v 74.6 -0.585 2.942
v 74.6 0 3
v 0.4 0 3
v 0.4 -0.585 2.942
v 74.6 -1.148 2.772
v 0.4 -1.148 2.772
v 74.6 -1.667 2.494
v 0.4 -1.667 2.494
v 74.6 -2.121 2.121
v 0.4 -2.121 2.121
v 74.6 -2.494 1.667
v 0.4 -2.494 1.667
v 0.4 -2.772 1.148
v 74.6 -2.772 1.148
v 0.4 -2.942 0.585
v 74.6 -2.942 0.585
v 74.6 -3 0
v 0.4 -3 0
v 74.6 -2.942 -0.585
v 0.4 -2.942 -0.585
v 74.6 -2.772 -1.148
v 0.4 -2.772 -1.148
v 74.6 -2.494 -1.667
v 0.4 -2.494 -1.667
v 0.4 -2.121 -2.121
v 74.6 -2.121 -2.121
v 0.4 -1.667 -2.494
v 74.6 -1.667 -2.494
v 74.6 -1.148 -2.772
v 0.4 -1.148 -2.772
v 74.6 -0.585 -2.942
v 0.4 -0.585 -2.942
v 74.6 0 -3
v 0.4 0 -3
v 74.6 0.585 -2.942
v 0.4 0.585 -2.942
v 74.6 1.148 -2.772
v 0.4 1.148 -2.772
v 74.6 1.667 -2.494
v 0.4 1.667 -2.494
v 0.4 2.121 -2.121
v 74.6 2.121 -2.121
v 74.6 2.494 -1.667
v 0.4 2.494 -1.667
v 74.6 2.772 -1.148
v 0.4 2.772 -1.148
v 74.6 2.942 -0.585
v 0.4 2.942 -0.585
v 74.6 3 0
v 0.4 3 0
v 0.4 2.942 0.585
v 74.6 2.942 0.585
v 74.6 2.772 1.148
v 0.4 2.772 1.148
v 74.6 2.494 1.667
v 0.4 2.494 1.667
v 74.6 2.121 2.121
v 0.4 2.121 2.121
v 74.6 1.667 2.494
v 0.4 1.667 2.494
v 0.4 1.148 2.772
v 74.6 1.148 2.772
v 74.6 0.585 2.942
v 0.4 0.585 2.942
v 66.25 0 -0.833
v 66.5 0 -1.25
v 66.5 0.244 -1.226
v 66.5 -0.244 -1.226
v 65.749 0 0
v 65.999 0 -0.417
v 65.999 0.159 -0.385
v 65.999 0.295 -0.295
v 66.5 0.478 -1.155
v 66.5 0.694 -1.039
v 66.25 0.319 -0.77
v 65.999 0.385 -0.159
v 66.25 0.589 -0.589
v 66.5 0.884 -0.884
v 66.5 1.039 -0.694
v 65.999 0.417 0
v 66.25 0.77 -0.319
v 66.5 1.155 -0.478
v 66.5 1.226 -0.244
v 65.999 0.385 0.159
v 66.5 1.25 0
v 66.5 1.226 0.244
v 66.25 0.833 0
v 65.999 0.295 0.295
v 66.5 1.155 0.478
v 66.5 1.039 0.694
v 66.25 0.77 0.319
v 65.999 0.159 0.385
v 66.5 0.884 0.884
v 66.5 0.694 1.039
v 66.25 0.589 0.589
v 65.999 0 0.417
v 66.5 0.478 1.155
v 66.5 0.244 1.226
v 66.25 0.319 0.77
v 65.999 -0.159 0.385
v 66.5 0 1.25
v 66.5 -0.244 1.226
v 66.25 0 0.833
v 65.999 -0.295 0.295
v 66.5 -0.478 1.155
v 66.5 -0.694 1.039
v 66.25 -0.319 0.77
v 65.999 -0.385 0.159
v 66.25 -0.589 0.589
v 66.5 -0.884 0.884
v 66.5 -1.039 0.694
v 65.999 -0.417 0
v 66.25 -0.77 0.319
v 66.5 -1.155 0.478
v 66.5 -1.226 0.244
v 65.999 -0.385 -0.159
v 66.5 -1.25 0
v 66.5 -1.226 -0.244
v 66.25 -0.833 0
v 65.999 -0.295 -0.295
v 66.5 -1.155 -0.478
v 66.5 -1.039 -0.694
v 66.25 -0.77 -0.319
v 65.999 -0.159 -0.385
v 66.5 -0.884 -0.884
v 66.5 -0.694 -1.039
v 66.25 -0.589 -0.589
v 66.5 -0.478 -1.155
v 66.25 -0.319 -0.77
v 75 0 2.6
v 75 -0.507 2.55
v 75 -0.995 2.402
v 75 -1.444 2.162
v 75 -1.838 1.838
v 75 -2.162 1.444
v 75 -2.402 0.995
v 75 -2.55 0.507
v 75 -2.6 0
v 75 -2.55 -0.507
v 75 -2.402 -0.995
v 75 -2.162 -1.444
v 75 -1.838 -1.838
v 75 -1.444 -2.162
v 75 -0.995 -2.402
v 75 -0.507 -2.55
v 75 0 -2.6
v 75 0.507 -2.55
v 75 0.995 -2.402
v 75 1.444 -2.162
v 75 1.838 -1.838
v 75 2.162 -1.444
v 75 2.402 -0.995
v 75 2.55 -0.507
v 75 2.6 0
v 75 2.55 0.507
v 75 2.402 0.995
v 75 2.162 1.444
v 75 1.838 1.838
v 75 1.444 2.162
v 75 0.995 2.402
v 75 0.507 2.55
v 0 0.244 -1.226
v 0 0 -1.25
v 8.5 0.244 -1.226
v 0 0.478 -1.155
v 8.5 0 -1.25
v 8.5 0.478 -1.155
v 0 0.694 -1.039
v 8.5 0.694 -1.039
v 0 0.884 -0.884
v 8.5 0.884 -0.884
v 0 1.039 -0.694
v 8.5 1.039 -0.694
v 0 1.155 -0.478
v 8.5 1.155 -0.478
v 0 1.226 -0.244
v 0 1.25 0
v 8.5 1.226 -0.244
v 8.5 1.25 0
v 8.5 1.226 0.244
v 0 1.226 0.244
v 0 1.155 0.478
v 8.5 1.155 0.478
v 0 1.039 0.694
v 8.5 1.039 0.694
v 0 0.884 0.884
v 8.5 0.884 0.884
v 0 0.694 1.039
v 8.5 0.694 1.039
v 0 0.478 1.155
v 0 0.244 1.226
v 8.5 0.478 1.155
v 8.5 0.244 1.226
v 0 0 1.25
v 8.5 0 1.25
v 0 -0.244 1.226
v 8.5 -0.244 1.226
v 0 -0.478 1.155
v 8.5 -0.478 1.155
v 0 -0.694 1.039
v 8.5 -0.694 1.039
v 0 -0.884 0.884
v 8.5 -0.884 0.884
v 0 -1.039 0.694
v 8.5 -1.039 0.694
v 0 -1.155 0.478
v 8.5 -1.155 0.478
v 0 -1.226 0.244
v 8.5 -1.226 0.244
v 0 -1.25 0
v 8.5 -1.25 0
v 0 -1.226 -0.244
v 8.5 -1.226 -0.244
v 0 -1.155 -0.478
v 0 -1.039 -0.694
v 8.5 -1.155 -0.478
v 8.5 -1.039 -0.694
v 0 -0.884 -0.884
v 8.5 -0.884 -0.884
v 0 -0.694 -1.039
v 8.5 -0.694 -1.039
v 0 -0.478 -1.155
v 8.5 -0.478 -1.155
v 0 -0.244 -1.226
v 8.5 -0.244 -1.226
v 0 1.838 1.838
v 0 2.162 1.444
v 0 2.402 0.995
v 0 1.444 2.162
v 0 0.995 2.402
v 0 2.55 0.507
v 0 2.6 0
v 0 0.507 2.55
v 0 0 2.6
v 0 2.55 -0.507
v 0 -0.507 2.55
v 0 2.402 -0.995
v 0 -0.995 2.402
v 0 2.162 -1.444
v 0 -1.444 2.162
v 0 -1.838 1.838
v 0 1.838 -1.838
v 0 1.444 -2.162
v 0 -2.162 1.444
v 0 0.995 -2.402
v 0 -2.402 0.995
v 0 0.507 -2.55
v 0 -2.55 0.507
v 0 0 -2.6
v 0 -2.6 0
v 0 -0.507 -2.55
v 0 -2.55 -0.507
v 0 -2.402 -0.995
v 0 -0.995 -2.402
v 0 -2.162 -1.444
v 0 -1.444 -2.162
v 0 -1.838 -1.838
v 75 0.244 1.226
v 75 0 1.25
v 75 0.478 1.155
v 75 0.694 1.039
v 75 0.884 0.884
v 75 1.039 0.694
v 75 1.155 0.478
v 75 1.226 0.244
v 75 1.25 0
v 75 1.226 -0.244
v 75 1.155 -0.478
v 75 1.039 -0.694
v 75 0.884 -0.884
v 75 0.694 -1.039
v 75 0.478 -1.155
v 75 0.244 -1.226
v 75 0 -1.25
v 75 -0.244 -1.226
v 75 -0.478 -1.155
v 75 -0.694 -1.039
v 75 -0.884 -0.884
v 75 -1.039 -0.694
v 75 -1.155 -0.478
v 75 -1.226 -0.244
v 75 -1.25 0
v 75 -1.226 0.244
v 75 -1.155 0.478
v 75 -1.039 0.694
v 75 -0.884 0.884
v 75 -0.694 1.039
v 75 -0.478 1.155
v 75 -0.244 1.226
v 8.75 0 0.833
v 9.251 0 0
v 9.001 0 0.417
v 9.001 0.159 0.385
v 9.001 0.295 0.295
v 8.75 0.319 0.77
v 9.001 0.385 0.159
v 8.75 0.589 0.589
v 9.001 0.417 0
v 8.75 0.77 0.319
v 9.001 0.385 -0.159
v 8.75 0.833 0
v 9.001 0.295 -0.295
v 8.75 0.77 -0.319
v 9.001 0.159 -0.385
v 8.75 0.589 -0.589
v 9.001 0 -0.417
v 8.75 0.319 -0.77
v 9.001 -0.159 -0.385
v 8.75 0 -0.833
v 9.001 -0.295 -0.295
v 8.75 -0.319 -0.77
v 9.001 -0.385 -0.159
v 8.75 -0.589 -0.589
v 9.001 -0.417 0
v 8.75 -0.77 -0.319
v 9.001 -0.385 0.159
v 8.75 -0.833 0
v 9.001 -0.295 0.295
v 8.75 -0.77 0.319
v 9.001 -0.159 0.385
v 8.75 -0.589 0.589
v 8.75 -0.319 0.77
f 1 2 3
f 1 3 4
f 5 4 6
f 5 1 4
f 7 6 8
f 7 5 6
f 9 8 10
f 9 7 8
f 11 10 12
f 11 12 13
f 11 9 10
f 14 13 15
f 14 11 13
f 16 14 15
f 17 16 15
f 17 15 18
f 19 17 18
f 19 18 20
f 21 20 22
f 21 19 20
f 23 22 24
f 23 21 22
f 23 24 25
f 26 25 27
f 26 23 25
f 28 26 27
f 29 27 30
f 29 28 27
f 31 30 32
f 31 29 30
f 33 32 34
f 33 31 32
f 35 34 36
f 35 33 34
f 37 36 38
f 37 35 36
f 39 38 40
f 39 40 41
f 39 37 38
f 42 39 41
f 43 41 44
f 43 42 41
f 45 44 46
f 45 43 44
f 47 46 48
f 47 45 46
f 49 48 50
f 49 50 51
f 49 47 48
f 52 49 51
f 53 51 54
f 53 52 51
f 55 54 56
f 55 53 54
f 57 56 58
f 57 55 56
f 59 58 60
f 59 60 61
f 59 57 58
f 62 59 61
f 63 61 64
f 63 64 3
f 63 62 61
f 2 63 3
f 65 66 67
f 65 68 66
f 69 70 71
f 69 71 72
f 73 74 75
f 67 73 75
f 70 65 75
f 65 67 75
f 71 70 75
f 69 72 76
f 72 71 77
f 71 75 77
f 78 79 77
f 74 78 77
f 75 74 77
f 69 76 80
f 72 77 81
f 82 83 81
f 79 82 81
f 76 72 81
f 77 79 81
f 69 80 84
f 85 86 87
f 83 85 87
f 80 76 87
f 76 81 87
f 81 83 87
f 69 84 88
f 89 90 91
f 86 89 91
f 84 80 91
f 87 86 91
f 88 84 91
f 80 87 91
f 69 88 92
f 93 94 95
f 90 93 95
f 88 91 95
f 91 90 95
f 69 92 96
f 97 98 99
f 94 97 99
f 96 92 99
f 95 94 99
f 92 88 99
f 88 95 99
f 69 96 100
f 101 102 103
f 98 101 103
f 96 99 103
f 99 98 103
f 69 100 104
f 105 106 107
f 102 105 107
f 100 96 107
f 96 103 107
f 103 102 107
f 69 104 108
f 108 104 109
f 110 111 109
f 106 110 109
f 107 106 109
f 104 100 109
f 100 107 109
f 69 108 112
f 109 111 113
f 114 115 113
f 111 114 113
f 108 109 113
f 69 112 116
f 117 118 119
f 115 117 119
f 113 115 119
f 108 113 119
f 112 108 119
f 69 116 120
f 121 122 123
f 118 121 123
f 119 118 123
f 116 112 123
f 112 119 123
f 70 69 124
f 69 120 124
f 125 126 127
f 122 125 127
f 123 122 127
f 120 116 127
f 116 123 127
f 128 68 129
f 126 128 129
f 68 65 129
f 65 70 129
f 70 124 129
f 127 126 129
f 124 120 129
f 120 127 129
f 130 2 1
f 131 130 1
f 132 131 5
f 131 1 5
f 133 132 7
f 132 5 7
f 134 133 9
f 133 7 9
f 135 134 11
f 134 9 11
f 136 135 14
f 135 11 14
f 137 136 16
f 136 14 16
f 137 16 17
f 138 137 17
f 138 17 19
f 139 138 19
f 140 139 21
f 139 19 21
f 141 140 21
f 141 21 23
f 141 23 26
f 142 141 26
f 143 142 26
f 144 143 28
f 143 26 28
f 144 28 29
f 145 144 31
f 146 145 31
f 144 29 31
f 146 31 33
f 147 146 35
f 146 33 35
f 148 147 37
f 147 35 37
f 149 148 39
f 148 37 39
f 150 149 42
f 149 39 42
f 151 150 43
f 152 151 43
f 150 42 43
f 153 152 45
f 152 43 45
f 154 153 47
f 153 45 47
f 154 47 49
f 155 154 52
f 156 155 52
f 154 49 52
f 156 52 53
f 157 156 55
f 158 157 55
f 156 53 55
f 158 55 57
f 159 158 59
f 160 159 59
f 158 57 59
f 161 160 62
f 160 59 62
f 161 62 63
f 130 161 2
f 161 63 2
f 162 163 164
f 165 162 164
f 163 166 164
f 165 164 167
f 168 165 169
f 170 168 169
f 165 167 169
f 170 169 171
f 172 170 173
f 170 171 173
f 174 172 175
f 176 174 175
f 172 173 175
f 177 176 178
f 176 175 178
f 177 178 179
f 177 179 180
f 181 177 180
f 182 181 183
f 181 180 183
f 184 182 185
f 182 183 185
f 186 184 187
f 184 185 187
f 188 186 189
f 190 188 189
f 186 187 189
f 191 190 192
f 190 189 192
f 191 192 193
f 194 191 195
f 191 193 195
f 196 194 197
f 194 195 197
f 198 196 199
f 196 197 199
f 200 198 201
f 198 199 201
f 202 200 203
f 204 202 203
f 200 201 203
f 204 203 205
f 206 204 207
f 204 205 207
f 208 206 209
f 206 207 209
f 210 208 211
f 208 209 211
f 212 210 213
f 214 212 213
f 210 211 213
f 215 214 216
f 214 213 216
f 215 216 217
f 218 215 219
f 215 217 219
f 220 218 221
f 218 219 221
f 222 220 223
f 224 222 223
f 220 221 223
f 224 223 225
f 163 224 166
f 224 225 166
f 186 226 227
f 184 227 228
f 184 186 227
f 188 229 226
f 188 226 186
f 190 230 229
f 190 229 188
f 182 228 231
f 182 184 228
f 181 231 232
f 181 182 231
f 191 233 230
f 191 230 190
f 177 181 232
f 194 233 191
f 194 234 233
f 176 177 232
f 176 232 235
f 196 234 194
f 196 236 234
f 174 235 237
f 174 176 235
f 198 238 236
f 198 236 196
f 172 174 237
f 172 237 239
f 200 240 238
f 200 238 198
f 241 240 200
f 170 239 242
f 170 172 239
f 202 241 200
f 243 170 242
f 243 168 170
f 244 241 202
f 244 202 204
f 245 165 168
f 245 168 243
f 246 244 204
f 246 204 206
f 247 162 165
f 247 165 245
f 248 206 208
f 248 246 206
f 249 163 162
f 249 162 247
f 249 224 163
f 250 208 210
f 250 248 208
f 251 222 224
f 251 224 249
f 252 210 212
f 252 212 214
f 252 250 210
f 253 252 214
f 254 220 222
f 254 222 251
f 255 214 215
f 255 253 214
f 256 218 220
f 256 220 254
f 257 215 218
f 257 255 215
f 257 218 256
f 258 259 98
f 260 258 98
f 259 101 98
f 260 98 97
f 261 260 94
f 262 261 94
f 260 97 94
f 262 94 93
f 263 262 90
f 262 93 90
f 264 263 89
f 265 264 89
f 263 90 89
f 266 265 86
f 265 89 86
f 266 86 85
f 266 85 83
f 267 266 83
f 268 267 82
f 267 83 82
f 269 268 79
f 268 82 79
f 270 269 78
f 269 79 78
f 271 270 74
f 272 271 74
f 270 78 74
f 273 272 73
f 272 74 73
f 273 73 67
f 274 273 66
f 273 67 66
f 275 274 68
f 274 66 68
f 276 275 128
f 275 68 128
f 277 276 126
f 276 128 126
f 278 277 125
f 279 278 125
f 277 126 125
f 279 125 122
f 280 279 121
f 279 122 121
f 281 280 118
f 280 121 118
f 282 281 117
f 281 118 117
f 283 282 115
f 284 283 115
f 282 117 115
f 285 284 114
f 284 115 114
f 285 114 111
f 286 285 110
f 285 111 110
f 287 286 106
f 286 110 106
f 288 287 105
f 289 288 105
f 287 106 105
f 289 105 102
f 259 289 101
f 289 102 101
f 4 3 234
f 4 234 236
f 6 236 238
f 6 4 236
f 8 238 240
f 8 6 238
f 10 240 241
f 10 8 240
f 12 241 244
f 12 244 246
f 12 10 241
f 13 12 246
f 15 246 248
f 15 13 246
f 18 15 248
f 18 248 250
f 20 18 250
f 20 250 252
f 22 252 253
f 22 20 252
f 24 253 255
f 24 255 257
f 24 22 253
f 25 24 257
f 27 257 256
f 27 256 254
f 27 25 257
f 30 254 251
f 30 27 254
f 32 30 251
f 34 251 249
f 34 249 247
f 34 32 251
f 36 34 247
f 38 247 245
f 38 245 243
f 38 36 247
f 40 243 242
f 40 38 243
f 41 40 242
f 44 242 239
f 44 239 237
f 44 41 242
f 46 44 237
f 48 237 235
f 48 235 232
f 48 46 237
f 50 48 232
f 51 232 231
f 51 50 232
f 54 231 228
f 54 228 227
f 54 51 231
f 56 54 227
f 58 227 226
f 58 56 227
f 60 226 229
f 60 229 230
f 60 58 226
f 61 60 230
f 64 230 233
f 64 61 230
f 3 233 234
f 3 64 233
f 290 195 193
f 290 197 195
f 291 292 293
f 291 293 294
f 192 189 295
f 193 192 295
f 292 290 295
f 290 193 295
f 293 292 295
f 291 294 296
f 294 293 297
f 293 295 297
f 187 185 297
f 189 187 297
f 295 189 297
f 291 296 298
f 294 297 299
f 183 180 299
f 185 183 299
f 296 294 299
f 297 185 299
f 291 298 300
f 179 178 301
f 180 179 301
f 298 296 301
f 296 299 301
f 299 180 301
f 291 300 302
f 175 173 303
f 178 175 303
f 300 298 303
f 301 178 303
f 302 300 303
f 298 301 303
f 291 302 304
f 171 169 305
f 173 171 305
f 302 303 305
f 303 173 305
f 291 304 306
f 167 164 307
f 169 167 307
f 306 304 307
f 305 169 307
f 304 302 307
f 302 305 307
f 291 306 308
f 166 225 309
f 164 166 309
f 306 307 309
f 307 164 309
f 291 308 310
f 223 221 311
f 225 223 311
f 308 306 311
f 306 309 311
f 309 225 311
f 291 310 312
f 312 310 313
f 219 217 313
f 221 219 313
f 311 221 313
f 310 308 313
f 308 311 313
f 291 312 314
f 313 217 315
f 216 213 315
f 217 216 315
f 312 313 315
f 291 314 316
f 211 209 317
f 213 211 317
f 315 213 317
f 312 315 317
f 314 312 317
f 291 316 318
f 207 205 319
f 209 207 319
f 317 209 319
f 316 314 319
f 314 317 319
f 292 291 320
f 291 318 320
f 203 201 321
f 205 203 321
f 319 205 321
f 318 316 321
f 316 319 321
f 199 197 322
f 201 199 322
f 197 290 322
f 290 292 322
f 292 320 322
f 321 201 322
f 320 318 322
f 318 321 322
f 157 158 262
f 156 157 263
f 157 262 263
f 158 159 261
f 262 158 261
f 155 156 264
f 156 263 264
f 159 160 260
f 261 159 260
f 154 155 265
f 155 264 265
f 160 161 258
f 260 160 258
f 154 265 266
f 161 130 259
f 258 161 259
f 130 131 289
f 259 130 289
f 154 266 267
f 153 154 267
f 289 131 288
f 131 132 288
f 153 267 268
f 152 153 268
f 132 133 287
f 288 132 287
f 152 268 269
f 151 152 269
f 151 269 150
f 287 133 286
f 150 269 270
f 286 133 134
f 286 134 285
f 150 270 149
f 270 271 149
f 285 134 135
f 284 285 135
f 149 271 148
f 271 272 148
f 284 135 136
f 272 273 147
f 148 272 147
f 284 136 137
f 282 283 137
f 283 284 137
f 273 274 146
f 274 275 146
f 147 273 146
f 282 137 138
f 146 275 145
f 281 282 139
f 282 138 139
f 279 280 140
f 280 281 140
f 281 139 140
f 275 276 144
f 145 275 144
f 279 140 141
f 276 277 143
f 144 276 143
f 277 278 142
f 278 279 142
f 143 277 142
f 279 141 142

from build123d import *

# Parameters (mm, degrees)
SKETCH1_W           = 75
SKETCH1_H           = 3
CHAMFER1_SIZE       = 0.4
TAPPED_HOLE10_D     = 2.5
TAPPED_HOLE10_DEPTH = 8.5
TAPPED_HOLE10_TIP   = 0.751075774
TAPPED_HOLE11_D     = 2.5
TAPPED_HOLE11_DEPTH = 8.5
TAPPED_HOLE11_TIP   = 0.751075774


with BuildPart() as part:
    # Sketch1 → Revolve1 (revolve)
    with BuildSketch(Plane.XY, mode=Mode.PRIVATE) as revolve1_sk:
        with Locations((37.5, 1.5)):
            Rectangle(SKETCH1_W, SKETCH1_H)
    revolve(revolve1_sk.sketch.rotate(Axis((0, 0, 0), (1, 0, 0)), 90), axis=Axis((0, 0, 0), (1, 0, 0)))

    # Chamfer1
    chamfer1_edges = [part.edges().sort_by_distance(p)[0] for p in [
        (0, 0, -3),
        (75, 0, -3),
    ]]
    chamfer(chamfer1_edges, length=CHAMFER1_SIZE)

    # Tapped Hole10
    with Locations(Plane.ZY):
        with Locations((0, 0)):
            Hole(TAPPED_HOLE10_D / 2, depth=TAPPED_HOLE10_DEPTH)
            with Locations((0, 0, -(TAPPED_HOLE10_DEPTH + TAPPED_HOLE10_TIP / 2))):  # 118° drill point
                Cone(0, TAPPED_HOLE10_D / 2, TAPPED_HOLE10_TIP, mode=Mode.SUBTRACT)

    # Tapped Hole11
    with Locations(Plane(origin=(75, 0, 0), x_dir=(0, 0, -1), z_dir=(1, 0, 0))):
        with Locations((0, 0)):
            Hole(TAPPED_HOLE11_D / 2, depth=TAPPED_HOLE11_DEPTH)
            with Locations((0, 0, -(TAPPED_HOLE11_DEPTH + TAPPED_HOLE11_TIP / 2))):  # 118° drill point
                Cone(0, TAPPED_HOLE11_D / 2, TAPPED_HOLE11_TIP, mode=Mode.SUBTRACT)


solid = part.part
